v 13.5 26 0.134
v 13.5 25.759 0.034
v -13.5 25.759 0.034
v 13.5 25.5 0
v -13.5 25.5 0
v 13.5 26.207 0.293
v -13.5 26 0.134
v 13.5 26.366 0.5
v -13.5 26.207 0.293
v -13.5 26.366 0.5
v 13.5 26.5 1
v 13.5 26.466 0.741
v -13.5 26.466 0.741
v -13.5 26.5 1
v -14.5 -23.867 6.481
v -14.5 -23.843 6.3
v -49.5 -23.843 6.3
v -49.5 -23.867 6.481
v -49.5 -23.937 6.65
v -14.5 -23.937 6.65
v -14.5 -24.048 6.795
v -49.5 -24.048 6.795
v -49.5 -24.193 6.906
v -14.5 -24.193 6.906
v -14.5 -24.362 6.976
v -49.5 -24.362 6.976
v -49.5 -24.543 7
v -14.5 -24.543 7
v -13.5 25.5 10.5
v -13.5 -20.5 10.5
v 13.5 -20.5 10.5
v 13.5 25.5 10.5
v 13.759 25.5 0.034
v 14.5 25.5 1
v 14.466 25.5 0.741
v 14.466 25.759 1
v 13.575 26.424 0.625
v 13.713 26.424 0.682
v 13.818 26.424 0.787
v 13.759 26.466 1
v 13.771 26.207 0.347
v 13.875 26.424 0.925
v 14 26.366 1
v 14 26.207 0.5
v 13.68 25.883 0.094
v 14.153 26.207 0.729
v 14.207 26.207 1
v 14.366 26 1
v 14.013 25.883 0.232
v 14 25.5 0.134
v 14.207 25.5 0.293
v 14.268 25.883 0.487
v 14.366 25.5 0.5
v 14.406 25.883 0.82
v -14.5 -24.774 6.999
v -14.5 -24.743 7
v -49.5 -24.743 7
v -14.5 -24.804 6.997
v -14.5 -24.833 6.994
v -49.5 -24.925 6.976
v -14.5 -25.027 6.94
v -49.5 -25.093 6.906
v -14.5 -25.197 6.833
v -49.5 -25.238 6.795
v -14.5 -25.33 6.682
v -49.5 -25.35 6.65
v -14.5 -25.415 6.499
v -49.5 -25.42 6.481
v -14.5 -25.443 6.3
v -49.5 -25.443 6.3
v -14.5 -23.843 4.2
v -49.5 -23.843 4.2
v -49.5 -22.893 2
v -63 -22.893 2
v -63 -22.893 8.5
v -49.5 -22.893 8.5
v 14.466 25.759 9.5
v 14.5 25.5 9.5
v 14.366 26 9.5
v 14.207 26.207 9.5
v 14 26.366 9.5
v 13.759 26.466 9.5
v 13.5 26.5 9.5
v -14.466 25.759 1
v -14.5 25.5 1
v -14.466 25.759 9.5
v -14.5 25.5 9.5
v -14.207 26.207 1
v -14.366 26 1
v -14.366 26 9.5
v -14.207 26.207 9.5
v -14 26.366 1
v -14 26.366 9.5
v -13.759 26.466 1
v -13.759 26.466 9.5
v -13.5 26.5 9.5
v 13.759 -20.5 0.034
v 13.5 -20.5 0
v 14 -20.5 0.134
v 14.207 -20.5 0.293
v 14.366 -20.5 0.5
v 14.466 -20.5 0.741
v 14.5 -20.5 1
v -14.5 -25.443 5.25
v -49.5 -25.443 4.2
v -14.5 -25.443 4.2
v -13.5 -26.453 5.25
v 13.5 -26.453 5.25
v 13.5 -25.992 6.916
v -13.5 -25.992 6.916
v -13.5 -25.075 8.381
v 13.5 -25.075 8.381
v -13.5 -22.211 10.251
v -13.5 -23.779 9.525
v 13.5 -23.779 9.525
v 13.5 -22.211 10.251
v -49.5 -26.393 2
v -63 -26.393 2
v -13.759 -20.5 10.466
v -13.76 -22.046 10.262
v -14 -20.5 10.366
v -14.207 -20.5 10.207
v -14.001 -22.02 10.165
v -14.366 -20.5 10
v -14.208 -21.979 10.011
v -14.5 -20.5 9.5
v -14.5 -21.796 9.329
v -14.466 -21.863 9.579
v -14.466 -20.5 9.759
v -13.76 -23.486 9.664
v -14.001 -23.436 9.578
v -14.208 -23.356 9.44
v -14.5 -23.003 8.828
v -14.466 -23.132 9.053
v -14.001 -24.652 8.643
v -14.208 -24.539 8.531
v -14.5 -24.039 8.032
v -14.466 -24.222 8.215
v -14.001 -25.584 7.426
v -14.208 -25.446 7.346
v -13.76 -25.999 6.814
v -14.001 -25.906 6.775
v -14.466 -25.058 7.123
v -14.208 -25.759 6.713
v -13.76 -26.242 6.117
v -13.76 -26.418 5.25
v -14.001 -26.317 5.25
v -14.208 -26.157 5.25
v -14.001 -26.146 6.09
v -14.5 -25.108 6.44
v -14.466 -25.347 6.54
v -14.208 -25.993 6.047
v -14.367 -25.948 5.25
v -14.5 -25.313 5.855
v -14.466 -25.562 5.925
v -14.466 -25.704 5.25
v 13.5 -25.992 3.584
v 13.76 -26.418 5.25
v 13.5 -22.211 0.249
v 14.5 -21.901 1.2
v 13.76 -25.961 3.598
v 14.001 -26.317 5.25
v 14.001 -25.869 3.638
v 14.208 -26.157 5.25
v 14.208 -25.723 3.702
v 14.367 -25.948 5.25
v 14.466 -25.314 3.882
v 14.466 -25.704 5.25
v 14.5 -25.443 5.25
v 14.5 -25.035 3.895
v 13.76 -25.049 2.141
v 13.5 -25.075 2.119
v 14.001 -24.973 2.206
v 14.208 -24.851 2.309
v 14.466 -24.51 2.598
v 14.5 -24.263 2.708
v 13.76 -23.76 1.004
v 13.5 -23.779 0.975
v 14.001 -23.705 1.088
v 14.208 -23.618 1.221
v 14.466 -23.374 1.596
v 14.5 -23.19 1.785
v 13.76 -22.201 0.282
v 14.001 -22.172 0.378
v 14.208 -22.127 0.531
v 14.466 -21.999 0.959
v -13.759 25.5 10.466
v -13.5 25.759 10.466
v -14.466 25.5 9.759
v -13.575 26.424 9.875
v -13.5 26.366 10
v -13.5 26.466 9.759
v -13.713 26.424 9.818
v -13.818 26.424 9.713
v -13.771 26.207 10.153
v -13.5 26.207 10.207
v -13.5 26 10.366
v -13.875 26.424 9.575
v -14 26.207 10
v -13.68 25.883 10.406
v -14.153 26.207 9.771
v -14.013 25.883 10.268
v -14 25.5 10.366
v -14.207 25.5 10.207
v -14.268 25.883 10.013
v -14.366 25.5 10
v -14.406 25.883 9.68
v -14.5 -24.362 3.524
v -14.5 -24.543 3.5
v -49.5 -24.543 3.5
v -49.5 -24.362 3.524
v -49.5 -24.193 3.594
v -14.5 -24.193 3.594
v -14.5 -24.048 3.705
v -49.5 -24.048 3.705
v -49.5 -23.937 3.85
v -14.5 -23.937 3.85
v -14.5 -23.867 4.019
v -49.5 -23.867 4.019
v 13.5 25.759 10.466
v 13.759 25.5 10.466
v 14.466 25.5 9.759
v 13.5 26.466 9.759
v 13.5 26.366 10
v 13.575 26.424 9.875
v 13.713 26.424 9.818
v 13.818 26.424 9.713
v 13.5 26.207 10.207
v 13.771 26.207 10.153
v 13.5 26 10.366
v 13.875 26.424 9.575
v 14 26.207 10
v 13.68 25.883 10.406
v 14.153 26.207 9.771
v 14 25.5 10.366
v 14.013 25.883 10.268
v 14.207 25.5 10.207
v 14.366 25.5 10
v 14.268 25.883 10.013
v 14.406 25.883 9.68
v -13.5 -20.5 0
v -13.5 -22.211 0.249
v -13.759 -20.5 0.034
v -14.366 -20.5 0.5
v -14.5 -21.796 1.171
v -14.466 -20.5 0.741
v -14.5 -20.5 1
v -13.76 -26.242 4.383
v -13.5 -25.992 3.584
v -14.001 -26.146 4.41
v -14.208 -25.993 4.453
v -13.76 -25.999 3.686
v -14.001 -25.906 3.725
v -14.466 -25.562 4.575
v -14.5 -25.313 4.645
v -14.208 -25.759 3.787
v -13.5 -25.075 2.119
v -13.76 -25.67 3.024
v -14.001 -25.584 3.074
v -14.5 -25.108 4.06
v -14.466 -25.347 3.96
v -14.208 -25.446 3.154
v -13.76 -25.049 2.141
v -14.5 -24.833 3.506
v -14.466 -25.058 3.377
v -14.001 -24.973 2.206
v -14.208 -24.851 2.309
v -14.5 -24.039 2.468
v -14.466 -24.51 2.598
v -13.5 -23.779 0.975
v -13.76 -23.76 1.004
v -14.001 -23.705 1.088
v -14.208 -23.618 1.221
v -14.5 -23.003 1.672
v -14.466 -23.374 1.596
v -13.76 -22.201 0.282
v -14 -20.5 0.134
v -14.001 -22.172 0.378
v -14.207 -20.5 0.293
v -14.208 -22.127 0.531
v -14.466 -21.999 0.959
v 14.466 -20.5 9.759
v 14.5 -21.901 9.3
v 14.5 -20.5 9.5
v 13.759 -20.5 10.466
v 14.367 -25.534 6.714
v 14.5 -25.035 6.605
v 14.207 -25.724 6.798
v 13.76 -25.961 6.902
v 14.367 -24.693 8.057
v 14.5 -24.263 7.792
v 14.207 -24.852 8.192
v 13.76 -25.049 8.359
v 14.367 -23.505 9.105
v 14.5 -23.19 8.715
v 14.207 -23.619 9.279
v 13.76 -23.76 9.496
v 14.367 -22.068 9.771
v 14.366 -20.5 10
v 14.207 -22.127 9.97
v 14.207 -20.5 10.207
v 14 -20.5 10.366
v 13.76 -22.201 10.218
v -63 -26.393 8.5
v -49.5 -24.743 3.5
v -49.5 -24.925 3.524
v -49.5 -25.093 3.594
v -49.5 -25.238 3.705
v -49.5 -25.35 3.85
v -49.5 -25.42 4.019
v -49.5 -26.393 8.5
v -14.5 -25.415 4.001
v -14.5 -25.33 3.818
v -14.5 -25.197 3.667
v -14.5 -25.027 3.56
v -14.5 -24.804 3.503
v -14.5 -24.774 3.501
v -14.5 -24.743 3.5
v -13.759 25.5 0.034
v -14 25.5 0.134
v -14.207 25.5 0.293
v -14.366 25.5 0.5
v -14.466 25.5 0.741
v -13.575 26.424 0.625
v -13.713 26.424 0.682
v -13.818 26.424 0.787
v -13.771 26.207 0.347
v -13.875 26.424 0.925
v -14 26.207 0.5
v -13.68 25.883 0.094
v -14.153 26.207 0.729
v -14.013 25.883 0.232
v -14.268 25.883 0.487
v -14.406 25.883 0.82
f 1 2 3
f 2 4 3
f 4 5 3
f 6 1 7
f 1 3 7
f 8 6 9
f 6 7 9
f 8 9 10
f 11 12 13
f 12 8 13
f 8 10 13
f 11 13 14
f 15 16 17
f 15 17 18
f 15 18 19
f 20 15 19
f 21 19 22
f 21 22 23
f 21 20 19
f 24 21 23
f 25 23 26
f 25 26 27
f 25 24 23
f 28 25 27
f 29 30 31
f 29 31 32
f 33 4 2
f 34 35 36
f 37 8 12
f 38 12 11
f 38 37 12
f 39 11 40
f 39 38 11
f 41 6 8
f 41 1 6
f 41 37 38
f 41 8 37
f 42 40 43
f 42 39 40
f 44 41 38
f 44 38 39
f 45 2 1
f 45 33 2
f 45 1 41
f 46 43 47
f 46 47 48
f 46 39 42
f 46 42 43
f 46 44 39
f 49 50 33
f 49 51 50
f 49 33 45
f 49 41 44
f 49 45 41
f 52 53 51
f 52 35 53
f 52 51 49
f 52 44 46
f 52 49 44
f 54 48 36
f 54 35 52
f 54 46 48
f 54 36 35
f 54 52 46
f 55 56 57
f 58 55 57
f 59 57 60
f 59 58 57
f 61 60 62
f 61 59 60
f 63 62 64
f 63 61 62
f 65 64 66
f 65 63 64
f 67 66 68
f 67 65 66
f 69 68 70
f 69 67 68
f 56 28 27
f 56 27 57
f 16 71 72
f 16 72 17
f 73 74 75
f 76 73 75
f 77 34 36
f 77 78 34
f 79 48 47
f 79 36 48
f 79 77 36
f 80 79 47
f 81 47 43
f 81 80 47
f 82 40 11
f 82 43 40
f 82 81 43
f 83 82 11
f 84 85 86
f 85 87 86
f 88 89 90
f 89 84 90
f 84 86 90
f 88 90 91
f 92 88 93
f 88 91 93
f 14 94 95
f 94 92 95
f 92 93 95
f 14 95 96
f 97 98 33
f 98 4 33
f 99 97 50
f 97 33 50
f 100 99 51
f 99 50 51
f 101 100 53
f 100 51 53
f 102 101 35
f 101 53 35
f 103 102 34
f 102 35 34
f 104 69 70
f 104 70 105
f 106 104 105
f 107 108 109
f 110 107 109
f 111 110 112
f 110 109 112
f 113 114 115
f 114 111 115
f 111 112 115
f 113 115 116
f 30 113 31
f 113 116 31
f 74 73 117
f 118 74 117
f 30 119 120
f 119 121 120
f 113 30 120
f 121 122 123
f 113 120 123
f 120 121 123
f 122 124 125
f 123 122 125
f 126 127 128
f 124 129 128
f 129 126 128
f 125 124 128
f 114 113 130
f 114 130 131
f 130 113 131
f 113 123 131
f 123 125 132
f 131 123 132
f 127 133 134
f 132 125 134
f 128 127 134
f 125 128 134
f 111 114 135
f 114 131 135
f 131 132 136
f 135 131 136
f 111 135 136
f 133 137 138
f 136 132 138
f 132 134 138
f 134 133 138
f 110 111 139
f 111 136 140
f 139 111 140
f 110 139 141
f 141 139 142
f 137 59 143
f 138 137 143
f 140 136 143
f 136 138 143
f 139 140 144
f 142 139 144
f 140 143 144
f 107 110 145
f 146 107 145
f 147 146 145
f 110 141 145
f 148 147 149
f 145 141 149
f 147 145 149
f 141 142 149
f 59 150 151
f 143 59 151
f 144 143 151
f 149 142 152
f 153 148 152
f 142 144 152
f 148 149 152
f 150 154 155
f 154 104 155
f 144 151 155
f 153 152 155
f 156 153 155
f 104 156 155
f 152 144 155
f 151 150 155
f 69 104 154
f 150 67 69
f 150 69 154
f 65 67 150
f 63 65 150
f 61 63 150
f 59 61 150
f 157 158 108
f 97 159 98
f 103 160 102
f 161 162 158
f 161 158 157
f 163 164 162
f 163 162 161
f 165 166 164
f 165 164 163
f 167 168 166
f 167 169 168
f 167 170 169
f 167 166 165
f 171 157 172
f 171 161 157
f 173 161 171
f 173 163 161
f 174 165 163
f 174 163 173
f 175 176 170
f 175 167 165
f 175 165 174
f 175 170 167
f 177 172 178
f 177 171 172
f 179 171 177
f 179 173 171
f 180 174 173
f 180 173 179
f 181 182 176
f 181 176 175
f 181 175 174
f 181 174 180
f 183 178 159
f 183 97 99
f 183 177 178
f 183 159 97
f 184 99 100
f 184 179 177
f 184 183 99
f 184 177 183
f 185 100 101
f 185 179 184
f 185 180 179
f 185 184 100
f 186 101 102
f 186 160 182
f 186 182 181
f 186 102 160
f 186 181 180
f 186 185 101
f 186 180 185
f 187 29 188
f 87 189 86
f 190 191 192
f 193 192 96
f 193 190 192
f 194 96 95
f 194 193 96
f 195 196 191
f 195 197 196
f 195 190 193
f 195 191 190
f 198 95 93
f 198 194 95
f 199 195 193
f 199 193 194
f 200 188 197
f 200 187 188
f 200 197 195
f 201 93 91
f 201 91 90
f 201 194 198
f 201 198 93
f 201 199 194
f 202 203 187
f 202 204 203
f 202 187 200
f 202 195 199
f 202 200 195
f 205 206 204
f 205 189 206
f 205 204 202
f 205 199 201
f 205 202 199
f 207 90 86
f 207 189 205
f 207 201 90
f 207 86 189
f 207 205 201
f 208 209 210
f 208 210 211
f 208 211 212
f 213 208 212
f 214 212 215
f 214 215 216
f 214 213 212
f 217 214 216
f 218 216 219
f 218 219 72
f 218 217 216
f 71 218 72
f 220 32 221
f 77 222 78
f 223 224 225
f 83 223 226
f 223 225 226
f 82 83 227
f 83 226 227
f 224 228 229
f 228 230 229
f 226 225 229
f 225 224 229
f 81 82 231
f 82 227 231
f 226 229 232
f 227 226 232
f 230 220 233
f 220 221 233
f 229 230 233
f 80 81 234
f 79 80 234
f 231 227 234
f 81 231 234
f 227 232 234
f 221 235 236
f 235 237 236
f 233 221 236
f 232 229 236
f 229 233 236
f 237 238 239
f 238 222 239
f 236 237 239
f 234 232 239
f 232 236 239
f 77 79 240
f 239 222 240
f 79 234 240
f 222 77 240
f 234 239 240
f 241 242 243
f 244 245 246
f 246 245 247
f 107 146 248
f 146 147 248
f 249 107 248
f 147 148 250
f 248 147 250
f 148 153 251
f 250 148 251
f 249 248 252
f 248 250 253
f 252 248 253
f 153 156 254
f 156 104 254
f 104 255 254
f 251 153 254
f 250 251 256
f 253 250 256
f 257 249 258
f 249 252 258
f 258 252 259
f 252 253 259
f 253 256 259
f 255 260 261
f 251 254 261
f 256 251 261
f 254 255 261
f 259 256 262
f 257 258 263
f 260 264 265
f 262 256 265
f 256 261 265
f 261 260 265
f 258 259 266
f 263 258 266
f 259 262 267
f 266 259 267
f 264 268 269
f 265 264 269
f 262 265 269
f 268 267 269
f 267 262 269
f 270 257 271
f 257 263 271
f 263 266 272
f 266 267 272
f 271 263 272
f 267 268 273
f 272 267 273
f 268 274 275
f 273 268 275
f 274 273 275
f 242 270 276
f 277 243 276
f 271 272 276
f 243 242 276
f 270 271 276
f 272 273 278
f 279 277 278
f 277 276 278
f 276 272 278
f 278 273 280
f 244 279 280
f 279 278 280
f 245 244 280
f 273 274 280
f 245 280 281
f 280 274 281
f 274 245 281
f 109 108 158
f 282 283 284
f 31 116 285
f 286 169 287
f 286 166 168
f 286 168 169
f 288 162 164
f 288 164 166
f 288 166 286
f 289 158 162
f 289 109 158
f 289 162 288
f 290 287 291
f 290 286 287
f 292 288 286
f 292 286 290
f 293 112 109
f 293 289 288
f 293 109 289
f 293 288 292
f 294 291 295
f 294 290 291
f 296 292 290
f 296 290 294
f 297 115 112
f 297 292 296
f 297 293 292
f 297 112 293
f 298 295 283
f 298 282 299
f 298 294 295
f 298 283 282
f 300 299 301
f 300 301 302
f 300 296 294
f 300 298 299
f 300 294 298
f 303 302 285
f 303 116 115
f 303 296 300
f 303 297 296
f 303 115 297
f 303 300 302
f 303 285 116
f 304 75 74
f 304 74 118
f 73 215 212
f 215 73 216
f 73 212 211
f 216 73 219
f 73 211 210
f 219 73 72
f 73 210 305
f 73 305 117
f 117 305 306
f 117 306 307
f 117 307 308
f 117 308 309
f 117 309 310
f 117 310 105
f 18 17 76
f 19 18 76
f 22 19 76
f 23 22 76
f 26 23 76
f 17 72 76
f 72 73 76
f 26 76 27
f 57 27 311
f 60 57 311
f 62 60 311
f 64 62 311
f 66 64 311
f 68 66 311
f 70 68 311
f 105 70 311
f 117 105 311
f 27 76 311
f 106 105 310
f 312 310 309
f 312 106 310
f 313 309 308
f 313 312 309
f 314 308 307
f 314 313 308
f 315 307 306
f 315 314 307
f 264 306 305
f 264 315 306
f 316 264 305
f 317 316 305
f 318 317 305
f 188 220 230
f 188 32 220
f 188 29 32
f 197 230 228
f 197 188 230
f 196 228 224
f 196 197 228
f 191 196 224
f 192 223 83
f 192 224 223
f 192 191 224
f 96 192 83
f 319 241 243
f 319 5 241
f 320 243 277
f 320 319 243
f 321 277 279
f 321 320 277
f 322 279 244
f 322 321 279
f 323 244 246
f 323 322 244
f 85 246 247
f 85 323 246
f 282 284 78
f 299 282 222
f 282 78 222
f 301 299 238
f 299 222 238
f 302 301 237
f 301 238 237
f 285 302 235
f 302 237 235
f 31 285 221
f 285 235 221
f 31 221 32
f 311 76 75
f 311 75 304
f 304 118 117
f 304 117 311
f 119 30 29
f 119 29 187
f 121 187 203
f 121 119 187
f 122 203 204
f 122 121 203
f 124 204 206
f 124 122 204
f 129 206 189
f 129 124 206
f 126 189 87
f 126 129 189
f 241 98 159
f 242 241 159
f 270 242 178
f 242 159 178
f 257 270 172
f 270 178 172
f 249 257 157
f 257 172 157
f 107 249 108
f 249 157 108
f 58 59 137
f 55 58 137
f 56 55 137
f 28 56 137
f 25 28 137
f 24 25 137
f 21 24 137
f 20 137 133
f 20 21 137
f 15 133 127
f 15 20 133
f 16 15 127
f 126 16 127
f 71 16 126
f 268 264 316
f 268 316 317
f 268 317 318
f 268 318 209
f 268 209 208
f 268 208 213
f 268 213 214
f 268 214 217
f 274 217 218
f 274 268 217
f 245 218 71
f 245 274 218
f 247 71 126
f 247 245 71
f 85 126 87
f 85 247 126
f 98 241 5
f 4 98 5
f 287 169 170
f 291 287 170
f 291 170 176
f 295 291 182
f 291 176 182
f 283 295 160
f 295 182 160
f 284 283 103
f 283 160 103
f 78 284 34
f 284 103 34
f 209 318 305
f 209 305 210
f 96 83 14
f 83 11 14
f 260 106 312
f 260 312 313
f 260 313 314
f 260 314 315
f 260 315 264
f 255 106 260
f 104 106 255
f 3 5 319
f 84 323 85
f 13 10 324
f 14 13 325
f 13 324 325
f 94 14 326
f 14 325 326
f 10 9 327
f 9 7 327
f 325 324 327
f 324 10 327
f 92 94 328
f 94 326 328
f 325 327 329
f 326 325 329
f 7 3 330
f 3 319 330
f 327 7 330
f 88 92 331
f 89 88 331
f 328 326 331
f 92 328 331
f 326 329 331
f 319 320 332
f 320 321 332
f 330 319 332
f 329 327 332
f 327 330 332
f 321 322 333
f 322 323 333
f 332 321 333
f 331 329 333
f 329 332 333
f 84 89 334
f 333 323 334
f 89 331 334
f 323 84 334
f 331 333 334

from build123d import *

# Parameters (mm, degrees)
CROQUIS1_W              = 53
CROQUIS1_H              = 29
SALIENTE_EXTRUIR1_DEPTH = 10.5
REDONDEO1_R             = 6
REDONDEO2_R             = 1
SALIENTE_EXTRUIR2_DEPTH = 35
CROQUIS3_W              = 3.5
CROQUIS3_H              = 6.5
SALIENTE_EXTRUIR3_DEPTH = 13.5


with BuildPart() as part:
    # Croquis1 → Saliente-Extruir1 (new body)
    with BuildSketch(Plane(origin=(0, 0, 0), x_dir=(0, 1, 0), z_dir=(0, 0, 1))):
        Rectangle(CROQUIS1_W, CROQUIS1_H)
    extrude(amount=SALIENTE_EXTRUIR1_DEPTH)

    # Redondeo1
    # the kernel refuses this fillet: 6 mm, written as the material it takes off along each edge
    with BuildSketch(Plane(origin=(29.5, -26.5, 0), x_dir=(0, 0, 1), z_dir=(-1, 0, 0))) as redondeo1_piece_1:
        with BuildLine():
            CenterArc((REDONDEO1_R, REDONDEO1_R), REDONDEO1_R, 180, 90)
            Line((0, REDONDEO1_R), (0, 0))
            Line((0, 0), (REDONDEO1_R, 0))
        make_face()
    extrude(amount=59, mode=Mode.SUBTRACT)
    with BuildSketch(Plane(origin=(29.5, -26.5, 10.5), x_dir=(0, 0, -1), z_dir=(-1, 0, 0))) as redondeo1_piece_2:
        with BuildLine():
            CenterArc((REDONDEO1_R, -REDONDEO1_R), REDONDEO1_R, 90, 90)
            Line((0, -REDONDEO1_R), (0, 0))
            Line((0, 0), (REDONDEO1_R, 0))
        make_face()
    extrude(amount=59, mode=Mode.SUBTRACT)

    # Redondeo2
    redondeo2_edges = [part.edges().sort_by_distance(p)[0] for p in [
        (14.5, 3, 0),
        (14.5, 3, 10.5),
        (14.5, -24.468626967, 9),
        (14.5, -24.468626967, 1.5),
        (-14.5, -24.468626967, 9),
        (-14.5, -24.468626967, 1.5),
        (0, 26.5, 10.5),
        (-14.5, 3, 0),
        (0, 26.5, 0),
        (14.5, 26.5, 5.25),
        (-14.5, 26.5, 5.25),
        (-14.5, 3, 10.5),
    ]]
    fillet(redondeo2_edges, radius=REDONDEO2_R)

    # Croquis2 → Saliente-Extruir2 (add)
    with BuildSketch(Plane(origin=(-14.5, 0, 0), x_dir=(0, -1, 0), z_dir=(-1, 0, 0))):
        with BuildLine():
            Line((24.543429983, 7), (24.743429983, 7))
            ThreePointArc((24.743429983, 7), (25.23840473, 6.794974747), (25.443429983, 6.3))
            Line((25.443429983, 6.3), (25.443429983, 4.2))
            ThreePointArc((25.443429983, 4.2), (25.23840473, 3.705025253), (24.743429983, 3.5))
            Line((24.743429983, 3.5), (24.543429983, 3.5))
            ThreePointArc((24.543429983, 3.5), (24.048455236, 3.705025253), (23.843429983, 4.2))
            Line((23.843429983, 4.2), (23.843429983, 6.3))
            ThreePointArc((23.843429983, 6.3), (24.048455236, 6.794974747), (24.543429983, 7))
        make_face()
    extrude(amount=SALIENTE_EXTRUIR2_DEPTH)

    # Croquis3 → Saliente-Extruir3 (add)
    with BuildSketch(Plane(origin=(-49.5, 0, 0), x_dir=(0, -1, 0), z_dir=(-1, 0, 0))):
        with Locations((24.643429983, 5.25)):
            Rectangle(CROQUIS3_W, CROQUIS3_H)
    extrude(amount=SALIENTE_EXTRUIR3_DEPTH)


solid = part.part
